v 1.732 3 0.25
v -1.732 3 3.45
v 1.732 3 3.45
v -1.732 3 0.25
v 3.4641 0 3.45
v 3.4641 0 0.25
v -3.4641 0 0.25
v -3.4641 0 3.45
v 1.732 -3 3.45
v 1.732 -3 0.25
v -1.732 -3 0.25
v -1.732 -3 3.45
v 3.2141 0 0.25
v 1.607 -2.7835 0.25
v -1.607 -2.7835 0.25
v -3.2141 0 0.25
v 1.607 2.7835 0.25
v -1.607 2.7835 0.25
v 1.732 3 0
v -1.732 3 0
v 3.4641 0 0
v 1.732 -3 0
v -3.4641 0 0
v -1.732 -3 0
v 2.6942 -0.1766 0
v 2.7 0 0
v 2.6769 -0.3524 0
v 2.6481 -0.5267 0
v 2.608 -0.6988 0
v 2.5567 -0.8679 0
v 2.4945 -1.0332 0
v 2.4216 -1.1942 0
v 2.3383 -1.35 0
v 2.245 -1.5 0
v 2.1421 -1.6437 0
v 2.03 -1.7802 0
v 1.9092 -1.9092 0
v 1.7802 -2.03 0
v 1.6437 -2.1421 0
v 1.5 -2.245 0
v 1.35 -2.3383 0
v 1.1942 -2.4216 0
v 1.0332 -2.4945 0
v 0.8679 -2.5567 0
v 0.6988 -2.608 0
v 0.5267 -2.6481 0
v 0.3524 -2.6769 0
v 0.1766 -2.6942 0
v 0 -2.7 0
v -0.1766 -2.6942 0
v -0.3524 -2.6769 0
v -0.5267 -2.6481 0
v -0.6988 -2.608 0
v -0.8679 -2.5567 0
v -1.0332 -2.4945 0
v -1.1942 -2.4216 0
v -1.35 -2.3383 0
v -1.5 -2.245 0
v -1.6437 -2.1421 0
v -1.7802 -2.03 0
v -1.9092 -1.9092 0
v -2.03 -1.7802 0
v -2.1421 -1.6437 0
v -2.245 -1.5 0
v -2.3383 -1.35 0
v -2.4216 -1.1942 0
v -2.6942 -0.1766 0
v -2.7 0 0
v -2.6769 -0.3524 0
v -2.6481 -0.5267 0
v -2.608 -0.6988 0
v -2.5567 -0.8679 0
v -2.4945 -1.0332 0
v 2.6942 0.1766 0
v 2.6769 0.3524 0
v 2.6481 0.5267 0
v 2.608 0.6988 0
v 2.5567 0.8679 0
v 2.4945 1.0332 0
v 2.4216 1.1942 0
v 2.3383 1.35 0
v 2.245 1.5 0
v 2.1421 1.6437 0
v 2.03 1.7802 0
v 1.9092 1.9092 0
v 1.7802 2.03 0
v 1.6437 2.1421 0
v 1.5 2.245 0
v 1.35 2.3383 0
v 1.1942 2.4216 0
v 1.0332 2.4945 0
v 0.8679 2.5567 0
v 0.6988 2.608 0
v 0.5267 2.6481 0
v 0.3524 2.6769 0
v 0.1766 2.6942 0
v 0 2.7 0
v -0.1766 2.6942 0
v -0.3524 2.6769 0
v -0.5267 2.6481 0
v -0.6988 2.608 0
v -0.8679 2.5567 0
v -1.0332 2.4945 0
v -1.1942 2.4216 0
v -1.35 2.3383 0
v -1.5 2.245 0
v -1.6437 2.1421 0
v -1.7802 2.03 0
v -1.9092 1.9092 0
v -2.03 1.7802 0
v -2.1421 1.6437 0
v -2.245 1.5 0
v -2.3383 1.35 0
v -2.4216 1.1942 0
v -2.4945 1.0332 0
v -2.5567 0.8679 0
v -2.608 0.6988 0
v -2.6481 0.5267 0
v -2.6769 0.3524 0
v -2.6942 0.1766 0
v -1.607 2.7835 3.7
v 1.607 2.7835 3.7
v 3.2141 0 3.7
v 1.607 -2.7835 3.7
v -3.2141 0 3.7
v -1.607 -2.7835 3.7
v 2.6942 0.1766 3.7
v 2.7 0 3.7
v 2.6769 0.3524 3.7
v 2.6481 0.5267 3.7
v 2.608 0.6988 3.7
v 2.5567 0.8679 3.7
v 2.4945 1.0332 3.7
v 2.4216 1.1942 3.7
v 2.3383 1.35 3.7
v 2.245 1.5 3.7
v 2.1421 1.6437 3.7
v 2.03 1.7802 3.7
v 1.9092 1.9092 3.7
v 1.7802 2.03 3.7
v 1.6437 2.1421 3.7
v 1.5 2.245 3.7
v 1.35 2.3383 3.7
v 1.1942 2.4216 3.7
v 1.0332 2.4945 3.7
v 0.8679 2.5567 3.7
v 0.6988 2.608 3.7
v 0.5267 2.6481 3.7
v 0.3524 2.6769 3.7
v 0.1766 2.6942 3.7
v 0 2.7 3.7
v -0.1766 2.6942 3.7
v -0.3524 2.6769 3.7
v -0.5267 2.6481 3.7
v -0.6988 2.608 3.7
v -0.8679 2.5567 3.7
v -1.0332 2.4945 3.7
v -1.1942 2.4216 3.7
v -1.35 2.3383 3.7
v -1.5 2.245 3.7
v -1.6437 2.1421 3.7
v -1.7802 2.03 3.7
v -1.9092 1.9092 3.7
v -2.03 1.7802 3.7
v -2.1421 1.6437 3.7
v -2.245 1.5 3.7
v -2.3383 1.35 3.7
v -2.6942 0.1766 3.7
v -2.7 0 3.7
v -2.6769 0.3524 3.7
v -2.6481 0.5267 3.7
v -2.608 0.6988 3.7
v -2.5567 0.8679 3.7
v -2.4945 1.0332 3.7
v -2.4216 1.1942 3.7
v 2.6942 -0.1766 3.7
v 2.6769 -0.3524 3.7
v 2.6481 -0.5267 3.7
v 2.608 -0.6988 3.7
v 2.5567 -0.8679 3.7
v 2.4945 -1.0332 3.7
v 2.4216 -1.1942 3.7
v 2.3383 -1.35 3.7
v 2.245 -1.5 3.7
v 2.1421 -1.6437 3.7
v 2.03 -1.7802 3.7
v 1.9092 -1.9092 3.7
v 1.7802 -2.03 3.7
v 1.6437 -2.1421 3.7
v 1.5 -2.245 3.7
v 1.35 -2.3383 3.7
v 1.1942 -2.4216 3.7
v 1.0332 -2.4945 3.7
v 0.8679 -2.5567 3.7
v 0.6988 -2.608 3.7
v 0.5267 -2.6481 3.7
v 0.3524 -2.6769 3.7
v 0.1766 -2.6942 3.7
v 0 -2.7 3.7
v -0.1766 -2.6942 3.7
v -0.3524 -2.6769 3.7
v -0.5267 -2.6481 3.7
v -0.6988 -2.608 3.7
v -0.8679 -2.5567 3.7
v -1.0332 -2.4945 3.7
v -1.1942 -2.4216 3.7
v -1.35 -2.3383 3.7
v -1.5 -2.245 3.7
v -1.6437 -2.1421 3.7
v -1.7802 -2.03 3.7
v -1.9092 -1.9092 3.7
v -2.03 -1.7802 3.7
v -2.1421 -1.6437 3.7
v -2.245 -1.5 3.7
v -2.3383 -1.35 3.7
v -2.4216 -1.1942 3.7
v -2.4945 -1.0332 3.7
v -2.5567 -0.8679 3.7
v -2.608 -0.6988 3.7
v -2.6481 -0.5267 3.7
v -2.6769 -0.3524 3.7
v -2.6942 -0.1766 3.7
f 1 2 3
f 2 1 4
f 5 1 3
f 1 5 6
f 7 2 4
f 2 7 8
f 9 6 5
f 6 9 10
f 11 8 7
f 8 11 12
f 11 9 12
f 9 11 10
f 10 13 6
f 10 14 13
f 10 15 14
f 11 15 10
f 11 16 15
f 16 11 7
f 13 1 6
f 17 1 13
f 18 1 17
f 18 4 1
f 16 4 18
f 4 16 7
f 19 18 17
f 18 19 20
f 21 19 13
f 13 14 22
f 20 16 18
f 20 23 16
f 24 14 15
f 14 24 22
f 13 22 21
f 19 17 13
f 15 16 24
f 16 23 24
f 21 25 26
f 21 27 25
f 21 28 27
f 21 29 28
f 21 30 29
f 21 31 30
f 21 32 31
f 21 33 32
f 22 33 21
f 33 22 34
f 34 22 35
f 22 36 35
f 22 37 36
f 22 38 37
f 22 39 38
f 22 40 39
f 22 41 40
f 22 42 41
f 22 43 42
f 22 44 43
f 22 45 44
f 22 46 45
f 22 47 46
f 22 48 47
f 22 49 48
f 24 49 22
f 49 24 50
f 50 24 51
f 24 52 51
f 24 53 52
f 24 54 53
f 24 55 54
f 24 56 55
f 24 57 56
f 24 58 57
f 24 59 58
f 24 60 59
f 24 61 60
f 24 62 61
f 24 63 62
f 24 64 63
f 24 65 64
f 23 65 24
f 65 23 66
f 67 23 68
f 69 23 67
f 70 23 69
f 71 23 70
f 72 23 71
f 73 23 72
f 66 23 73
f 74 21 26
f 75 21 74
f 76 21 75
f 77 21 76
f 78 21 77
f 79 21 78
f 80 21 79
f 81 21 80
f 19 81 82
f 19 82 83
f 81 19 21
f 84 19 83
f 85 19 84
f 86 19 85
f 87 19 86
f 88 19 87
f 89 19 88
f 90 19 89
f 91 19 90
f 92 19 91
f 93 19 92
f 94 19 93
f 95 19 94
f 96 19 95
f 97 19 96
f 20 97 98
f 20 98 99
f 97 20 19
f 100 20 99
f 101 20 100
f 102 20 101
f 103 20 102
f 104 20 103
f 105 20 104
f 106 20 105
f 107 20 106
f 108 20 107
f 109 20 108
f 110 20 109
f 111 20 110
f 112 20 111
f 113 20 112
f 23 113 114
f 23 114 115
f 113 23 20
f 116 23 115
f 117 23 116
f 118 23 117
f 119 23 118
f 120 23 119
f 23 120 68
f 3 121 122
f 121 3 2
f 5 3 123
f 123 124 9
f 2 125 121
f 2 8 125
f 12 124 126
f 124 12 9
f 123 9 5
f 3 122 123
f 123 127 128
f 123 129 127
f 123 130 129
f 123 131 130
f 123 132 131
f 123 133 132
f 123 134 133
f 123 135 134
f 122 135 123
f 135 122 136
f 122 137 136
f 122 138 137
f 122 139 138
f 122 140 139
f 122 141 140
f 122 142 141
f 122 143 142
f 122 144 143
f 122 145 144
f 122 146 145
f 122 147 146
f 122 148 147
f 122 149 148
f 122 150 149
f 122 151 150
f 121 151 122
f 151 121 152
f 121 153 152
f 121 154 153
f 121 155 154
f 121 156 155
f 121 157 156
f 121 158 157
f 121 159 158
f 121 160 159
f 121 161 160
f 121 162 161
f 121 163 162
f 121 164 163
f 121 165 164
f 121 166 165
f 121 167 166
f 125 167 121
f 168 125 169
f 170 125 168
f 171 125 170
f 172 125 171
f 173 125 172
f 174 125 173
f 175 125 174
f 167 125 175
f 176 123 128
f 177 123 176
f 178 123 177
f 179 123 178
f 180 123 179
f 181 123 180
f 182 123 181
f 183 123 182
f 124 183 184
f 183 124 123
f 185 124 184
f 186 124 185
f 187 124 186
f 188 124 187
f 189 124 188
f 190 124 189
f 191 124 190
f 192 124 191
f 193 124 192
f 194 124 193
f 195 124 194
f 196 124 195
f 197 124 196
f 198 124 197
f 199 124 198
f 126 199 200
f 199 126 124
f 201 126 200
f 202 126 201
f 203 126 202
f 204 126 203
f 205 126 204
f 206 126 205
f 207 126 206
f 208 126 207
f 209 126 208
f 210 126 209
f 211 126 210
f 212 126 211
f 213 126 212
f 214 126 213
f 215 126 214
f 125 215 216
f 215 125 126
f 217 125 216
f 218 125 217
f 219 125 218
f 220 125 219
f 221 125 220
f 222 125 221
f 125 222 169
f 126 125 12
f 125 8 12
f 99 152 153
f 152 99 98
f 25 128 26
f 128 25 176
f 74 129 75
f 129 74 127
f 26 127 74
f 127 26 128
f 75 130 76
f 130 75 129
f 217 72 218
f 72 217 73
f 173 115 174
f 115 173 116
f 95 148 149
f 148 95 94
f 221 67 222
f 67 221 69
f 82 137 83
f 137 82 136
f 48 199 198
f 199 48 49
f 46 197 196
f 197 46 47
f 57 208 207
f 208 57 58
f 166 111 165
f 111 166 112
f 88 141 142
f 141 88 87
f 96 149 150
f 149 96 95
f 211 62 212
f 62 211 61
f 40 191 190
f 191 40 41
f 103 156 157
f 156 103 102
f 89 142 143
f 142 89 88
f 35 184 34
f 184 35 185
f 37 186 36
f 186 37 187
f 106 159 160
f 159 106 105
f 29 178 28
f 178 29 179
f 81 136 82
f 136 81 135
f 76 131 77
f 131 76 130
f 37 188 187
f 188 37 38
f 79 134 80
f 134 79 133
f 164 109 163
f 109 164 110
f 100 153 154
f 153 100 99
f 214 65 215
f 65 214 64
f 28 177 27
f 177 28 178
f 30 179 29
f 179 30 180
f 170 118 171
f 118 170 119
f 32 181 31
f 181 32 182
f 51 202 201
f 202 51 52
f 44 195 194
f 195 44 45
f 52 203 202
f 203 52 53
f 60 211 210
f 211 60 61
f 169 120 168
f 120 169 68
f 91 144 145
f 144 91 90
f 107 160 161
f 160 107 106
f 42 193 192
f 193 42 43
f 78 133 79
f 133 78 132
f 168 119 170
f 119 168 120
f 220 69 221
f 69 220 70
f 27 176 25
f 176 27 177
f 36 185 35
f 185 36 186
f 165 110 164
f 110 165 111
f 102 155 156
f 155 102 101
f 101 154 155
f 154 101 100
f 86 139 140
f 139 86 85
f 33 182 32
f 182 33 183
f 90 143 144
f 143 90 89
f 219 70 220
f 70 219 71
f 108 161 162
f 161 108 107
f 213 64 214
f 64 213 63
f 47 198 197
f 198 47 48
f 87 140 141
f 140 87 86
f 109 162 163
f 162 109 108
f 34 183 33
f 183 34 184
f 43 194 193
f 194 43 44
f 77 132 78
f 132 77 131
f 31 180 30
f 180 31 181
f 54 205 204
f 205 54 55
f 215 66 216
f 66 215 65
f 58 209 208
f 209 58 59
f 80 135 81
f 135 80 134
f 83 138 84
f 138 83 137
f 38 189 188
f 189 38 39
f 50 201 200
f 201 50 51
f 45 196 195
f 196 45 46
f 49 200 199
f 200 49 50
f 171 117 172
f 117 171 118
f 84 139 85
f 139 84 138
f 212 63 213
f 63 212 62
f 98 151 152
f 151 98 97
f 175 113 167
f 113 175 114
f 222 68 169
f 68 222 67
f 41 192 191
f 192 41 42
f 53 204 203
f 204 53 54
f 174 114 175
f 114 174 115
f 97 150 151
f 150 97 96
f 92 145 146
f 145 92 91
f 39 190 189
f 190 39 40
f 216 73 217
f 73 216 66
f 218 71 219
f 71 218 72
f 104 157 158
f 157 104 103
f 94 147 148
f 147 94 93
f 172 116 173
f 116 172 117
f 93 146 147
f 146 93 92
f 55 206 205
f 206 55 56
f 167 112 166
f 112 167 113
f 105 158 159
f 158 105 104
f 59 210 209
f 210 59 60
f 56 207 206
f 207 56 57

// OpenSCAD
$fn = 96;

// T-slot nut parameters (mm)
screw_d = 5.0;          // screw diameter
clearance = 0.4;        // clearance for through-hole
hole_d = screw_d + clearance;

across_flats = 6.0;     // hex across flats
thickness = 3.7;        // nut thickness

// Small edge chamfer (visual + easier insertion)
chamfer = 0.25;

// Derived
hex_R = across_flats / sqrt(3); // circumradius for hex with given across-flats

module hex_prism(h, R){
    linear_extrude(height=h)
        polygon([ for(i=[0:5]) [ R*cos(60*i), R*sin(60*i) ] ]);
}

module tslot_nut(){
    difference(){
        // Body with slight chamfer on both faces
        union(){
            // main
            translate([0,0,chamfer])
                hex_prism(thickness - 2*chamfer, hex_R);

            // bottom chamfer
            linear_extrude(height=chamfer, scale=(hex_R - chamfer)/hex_R)
                polygon([ for(i=[0:5]) [ hex_R*cos(60*i), hex_R*sin(60*i) ] ]);

            // top chamfer
            translate([0,0,thickness - chamfer])
                linear_extrude(height=chamfer, scale=(hex_R - chamfer)/hex_R)
                    polygon([ for(i=[0:5]) [ hex_R*cos(60*i), hex_R*sin(60*i) ] ]);
        }

        // Through hole
        translate([0,0,-0.5])
            cylinder(h=thickness+1.0, d=hole_d);
    }
}

tslot_nut();
